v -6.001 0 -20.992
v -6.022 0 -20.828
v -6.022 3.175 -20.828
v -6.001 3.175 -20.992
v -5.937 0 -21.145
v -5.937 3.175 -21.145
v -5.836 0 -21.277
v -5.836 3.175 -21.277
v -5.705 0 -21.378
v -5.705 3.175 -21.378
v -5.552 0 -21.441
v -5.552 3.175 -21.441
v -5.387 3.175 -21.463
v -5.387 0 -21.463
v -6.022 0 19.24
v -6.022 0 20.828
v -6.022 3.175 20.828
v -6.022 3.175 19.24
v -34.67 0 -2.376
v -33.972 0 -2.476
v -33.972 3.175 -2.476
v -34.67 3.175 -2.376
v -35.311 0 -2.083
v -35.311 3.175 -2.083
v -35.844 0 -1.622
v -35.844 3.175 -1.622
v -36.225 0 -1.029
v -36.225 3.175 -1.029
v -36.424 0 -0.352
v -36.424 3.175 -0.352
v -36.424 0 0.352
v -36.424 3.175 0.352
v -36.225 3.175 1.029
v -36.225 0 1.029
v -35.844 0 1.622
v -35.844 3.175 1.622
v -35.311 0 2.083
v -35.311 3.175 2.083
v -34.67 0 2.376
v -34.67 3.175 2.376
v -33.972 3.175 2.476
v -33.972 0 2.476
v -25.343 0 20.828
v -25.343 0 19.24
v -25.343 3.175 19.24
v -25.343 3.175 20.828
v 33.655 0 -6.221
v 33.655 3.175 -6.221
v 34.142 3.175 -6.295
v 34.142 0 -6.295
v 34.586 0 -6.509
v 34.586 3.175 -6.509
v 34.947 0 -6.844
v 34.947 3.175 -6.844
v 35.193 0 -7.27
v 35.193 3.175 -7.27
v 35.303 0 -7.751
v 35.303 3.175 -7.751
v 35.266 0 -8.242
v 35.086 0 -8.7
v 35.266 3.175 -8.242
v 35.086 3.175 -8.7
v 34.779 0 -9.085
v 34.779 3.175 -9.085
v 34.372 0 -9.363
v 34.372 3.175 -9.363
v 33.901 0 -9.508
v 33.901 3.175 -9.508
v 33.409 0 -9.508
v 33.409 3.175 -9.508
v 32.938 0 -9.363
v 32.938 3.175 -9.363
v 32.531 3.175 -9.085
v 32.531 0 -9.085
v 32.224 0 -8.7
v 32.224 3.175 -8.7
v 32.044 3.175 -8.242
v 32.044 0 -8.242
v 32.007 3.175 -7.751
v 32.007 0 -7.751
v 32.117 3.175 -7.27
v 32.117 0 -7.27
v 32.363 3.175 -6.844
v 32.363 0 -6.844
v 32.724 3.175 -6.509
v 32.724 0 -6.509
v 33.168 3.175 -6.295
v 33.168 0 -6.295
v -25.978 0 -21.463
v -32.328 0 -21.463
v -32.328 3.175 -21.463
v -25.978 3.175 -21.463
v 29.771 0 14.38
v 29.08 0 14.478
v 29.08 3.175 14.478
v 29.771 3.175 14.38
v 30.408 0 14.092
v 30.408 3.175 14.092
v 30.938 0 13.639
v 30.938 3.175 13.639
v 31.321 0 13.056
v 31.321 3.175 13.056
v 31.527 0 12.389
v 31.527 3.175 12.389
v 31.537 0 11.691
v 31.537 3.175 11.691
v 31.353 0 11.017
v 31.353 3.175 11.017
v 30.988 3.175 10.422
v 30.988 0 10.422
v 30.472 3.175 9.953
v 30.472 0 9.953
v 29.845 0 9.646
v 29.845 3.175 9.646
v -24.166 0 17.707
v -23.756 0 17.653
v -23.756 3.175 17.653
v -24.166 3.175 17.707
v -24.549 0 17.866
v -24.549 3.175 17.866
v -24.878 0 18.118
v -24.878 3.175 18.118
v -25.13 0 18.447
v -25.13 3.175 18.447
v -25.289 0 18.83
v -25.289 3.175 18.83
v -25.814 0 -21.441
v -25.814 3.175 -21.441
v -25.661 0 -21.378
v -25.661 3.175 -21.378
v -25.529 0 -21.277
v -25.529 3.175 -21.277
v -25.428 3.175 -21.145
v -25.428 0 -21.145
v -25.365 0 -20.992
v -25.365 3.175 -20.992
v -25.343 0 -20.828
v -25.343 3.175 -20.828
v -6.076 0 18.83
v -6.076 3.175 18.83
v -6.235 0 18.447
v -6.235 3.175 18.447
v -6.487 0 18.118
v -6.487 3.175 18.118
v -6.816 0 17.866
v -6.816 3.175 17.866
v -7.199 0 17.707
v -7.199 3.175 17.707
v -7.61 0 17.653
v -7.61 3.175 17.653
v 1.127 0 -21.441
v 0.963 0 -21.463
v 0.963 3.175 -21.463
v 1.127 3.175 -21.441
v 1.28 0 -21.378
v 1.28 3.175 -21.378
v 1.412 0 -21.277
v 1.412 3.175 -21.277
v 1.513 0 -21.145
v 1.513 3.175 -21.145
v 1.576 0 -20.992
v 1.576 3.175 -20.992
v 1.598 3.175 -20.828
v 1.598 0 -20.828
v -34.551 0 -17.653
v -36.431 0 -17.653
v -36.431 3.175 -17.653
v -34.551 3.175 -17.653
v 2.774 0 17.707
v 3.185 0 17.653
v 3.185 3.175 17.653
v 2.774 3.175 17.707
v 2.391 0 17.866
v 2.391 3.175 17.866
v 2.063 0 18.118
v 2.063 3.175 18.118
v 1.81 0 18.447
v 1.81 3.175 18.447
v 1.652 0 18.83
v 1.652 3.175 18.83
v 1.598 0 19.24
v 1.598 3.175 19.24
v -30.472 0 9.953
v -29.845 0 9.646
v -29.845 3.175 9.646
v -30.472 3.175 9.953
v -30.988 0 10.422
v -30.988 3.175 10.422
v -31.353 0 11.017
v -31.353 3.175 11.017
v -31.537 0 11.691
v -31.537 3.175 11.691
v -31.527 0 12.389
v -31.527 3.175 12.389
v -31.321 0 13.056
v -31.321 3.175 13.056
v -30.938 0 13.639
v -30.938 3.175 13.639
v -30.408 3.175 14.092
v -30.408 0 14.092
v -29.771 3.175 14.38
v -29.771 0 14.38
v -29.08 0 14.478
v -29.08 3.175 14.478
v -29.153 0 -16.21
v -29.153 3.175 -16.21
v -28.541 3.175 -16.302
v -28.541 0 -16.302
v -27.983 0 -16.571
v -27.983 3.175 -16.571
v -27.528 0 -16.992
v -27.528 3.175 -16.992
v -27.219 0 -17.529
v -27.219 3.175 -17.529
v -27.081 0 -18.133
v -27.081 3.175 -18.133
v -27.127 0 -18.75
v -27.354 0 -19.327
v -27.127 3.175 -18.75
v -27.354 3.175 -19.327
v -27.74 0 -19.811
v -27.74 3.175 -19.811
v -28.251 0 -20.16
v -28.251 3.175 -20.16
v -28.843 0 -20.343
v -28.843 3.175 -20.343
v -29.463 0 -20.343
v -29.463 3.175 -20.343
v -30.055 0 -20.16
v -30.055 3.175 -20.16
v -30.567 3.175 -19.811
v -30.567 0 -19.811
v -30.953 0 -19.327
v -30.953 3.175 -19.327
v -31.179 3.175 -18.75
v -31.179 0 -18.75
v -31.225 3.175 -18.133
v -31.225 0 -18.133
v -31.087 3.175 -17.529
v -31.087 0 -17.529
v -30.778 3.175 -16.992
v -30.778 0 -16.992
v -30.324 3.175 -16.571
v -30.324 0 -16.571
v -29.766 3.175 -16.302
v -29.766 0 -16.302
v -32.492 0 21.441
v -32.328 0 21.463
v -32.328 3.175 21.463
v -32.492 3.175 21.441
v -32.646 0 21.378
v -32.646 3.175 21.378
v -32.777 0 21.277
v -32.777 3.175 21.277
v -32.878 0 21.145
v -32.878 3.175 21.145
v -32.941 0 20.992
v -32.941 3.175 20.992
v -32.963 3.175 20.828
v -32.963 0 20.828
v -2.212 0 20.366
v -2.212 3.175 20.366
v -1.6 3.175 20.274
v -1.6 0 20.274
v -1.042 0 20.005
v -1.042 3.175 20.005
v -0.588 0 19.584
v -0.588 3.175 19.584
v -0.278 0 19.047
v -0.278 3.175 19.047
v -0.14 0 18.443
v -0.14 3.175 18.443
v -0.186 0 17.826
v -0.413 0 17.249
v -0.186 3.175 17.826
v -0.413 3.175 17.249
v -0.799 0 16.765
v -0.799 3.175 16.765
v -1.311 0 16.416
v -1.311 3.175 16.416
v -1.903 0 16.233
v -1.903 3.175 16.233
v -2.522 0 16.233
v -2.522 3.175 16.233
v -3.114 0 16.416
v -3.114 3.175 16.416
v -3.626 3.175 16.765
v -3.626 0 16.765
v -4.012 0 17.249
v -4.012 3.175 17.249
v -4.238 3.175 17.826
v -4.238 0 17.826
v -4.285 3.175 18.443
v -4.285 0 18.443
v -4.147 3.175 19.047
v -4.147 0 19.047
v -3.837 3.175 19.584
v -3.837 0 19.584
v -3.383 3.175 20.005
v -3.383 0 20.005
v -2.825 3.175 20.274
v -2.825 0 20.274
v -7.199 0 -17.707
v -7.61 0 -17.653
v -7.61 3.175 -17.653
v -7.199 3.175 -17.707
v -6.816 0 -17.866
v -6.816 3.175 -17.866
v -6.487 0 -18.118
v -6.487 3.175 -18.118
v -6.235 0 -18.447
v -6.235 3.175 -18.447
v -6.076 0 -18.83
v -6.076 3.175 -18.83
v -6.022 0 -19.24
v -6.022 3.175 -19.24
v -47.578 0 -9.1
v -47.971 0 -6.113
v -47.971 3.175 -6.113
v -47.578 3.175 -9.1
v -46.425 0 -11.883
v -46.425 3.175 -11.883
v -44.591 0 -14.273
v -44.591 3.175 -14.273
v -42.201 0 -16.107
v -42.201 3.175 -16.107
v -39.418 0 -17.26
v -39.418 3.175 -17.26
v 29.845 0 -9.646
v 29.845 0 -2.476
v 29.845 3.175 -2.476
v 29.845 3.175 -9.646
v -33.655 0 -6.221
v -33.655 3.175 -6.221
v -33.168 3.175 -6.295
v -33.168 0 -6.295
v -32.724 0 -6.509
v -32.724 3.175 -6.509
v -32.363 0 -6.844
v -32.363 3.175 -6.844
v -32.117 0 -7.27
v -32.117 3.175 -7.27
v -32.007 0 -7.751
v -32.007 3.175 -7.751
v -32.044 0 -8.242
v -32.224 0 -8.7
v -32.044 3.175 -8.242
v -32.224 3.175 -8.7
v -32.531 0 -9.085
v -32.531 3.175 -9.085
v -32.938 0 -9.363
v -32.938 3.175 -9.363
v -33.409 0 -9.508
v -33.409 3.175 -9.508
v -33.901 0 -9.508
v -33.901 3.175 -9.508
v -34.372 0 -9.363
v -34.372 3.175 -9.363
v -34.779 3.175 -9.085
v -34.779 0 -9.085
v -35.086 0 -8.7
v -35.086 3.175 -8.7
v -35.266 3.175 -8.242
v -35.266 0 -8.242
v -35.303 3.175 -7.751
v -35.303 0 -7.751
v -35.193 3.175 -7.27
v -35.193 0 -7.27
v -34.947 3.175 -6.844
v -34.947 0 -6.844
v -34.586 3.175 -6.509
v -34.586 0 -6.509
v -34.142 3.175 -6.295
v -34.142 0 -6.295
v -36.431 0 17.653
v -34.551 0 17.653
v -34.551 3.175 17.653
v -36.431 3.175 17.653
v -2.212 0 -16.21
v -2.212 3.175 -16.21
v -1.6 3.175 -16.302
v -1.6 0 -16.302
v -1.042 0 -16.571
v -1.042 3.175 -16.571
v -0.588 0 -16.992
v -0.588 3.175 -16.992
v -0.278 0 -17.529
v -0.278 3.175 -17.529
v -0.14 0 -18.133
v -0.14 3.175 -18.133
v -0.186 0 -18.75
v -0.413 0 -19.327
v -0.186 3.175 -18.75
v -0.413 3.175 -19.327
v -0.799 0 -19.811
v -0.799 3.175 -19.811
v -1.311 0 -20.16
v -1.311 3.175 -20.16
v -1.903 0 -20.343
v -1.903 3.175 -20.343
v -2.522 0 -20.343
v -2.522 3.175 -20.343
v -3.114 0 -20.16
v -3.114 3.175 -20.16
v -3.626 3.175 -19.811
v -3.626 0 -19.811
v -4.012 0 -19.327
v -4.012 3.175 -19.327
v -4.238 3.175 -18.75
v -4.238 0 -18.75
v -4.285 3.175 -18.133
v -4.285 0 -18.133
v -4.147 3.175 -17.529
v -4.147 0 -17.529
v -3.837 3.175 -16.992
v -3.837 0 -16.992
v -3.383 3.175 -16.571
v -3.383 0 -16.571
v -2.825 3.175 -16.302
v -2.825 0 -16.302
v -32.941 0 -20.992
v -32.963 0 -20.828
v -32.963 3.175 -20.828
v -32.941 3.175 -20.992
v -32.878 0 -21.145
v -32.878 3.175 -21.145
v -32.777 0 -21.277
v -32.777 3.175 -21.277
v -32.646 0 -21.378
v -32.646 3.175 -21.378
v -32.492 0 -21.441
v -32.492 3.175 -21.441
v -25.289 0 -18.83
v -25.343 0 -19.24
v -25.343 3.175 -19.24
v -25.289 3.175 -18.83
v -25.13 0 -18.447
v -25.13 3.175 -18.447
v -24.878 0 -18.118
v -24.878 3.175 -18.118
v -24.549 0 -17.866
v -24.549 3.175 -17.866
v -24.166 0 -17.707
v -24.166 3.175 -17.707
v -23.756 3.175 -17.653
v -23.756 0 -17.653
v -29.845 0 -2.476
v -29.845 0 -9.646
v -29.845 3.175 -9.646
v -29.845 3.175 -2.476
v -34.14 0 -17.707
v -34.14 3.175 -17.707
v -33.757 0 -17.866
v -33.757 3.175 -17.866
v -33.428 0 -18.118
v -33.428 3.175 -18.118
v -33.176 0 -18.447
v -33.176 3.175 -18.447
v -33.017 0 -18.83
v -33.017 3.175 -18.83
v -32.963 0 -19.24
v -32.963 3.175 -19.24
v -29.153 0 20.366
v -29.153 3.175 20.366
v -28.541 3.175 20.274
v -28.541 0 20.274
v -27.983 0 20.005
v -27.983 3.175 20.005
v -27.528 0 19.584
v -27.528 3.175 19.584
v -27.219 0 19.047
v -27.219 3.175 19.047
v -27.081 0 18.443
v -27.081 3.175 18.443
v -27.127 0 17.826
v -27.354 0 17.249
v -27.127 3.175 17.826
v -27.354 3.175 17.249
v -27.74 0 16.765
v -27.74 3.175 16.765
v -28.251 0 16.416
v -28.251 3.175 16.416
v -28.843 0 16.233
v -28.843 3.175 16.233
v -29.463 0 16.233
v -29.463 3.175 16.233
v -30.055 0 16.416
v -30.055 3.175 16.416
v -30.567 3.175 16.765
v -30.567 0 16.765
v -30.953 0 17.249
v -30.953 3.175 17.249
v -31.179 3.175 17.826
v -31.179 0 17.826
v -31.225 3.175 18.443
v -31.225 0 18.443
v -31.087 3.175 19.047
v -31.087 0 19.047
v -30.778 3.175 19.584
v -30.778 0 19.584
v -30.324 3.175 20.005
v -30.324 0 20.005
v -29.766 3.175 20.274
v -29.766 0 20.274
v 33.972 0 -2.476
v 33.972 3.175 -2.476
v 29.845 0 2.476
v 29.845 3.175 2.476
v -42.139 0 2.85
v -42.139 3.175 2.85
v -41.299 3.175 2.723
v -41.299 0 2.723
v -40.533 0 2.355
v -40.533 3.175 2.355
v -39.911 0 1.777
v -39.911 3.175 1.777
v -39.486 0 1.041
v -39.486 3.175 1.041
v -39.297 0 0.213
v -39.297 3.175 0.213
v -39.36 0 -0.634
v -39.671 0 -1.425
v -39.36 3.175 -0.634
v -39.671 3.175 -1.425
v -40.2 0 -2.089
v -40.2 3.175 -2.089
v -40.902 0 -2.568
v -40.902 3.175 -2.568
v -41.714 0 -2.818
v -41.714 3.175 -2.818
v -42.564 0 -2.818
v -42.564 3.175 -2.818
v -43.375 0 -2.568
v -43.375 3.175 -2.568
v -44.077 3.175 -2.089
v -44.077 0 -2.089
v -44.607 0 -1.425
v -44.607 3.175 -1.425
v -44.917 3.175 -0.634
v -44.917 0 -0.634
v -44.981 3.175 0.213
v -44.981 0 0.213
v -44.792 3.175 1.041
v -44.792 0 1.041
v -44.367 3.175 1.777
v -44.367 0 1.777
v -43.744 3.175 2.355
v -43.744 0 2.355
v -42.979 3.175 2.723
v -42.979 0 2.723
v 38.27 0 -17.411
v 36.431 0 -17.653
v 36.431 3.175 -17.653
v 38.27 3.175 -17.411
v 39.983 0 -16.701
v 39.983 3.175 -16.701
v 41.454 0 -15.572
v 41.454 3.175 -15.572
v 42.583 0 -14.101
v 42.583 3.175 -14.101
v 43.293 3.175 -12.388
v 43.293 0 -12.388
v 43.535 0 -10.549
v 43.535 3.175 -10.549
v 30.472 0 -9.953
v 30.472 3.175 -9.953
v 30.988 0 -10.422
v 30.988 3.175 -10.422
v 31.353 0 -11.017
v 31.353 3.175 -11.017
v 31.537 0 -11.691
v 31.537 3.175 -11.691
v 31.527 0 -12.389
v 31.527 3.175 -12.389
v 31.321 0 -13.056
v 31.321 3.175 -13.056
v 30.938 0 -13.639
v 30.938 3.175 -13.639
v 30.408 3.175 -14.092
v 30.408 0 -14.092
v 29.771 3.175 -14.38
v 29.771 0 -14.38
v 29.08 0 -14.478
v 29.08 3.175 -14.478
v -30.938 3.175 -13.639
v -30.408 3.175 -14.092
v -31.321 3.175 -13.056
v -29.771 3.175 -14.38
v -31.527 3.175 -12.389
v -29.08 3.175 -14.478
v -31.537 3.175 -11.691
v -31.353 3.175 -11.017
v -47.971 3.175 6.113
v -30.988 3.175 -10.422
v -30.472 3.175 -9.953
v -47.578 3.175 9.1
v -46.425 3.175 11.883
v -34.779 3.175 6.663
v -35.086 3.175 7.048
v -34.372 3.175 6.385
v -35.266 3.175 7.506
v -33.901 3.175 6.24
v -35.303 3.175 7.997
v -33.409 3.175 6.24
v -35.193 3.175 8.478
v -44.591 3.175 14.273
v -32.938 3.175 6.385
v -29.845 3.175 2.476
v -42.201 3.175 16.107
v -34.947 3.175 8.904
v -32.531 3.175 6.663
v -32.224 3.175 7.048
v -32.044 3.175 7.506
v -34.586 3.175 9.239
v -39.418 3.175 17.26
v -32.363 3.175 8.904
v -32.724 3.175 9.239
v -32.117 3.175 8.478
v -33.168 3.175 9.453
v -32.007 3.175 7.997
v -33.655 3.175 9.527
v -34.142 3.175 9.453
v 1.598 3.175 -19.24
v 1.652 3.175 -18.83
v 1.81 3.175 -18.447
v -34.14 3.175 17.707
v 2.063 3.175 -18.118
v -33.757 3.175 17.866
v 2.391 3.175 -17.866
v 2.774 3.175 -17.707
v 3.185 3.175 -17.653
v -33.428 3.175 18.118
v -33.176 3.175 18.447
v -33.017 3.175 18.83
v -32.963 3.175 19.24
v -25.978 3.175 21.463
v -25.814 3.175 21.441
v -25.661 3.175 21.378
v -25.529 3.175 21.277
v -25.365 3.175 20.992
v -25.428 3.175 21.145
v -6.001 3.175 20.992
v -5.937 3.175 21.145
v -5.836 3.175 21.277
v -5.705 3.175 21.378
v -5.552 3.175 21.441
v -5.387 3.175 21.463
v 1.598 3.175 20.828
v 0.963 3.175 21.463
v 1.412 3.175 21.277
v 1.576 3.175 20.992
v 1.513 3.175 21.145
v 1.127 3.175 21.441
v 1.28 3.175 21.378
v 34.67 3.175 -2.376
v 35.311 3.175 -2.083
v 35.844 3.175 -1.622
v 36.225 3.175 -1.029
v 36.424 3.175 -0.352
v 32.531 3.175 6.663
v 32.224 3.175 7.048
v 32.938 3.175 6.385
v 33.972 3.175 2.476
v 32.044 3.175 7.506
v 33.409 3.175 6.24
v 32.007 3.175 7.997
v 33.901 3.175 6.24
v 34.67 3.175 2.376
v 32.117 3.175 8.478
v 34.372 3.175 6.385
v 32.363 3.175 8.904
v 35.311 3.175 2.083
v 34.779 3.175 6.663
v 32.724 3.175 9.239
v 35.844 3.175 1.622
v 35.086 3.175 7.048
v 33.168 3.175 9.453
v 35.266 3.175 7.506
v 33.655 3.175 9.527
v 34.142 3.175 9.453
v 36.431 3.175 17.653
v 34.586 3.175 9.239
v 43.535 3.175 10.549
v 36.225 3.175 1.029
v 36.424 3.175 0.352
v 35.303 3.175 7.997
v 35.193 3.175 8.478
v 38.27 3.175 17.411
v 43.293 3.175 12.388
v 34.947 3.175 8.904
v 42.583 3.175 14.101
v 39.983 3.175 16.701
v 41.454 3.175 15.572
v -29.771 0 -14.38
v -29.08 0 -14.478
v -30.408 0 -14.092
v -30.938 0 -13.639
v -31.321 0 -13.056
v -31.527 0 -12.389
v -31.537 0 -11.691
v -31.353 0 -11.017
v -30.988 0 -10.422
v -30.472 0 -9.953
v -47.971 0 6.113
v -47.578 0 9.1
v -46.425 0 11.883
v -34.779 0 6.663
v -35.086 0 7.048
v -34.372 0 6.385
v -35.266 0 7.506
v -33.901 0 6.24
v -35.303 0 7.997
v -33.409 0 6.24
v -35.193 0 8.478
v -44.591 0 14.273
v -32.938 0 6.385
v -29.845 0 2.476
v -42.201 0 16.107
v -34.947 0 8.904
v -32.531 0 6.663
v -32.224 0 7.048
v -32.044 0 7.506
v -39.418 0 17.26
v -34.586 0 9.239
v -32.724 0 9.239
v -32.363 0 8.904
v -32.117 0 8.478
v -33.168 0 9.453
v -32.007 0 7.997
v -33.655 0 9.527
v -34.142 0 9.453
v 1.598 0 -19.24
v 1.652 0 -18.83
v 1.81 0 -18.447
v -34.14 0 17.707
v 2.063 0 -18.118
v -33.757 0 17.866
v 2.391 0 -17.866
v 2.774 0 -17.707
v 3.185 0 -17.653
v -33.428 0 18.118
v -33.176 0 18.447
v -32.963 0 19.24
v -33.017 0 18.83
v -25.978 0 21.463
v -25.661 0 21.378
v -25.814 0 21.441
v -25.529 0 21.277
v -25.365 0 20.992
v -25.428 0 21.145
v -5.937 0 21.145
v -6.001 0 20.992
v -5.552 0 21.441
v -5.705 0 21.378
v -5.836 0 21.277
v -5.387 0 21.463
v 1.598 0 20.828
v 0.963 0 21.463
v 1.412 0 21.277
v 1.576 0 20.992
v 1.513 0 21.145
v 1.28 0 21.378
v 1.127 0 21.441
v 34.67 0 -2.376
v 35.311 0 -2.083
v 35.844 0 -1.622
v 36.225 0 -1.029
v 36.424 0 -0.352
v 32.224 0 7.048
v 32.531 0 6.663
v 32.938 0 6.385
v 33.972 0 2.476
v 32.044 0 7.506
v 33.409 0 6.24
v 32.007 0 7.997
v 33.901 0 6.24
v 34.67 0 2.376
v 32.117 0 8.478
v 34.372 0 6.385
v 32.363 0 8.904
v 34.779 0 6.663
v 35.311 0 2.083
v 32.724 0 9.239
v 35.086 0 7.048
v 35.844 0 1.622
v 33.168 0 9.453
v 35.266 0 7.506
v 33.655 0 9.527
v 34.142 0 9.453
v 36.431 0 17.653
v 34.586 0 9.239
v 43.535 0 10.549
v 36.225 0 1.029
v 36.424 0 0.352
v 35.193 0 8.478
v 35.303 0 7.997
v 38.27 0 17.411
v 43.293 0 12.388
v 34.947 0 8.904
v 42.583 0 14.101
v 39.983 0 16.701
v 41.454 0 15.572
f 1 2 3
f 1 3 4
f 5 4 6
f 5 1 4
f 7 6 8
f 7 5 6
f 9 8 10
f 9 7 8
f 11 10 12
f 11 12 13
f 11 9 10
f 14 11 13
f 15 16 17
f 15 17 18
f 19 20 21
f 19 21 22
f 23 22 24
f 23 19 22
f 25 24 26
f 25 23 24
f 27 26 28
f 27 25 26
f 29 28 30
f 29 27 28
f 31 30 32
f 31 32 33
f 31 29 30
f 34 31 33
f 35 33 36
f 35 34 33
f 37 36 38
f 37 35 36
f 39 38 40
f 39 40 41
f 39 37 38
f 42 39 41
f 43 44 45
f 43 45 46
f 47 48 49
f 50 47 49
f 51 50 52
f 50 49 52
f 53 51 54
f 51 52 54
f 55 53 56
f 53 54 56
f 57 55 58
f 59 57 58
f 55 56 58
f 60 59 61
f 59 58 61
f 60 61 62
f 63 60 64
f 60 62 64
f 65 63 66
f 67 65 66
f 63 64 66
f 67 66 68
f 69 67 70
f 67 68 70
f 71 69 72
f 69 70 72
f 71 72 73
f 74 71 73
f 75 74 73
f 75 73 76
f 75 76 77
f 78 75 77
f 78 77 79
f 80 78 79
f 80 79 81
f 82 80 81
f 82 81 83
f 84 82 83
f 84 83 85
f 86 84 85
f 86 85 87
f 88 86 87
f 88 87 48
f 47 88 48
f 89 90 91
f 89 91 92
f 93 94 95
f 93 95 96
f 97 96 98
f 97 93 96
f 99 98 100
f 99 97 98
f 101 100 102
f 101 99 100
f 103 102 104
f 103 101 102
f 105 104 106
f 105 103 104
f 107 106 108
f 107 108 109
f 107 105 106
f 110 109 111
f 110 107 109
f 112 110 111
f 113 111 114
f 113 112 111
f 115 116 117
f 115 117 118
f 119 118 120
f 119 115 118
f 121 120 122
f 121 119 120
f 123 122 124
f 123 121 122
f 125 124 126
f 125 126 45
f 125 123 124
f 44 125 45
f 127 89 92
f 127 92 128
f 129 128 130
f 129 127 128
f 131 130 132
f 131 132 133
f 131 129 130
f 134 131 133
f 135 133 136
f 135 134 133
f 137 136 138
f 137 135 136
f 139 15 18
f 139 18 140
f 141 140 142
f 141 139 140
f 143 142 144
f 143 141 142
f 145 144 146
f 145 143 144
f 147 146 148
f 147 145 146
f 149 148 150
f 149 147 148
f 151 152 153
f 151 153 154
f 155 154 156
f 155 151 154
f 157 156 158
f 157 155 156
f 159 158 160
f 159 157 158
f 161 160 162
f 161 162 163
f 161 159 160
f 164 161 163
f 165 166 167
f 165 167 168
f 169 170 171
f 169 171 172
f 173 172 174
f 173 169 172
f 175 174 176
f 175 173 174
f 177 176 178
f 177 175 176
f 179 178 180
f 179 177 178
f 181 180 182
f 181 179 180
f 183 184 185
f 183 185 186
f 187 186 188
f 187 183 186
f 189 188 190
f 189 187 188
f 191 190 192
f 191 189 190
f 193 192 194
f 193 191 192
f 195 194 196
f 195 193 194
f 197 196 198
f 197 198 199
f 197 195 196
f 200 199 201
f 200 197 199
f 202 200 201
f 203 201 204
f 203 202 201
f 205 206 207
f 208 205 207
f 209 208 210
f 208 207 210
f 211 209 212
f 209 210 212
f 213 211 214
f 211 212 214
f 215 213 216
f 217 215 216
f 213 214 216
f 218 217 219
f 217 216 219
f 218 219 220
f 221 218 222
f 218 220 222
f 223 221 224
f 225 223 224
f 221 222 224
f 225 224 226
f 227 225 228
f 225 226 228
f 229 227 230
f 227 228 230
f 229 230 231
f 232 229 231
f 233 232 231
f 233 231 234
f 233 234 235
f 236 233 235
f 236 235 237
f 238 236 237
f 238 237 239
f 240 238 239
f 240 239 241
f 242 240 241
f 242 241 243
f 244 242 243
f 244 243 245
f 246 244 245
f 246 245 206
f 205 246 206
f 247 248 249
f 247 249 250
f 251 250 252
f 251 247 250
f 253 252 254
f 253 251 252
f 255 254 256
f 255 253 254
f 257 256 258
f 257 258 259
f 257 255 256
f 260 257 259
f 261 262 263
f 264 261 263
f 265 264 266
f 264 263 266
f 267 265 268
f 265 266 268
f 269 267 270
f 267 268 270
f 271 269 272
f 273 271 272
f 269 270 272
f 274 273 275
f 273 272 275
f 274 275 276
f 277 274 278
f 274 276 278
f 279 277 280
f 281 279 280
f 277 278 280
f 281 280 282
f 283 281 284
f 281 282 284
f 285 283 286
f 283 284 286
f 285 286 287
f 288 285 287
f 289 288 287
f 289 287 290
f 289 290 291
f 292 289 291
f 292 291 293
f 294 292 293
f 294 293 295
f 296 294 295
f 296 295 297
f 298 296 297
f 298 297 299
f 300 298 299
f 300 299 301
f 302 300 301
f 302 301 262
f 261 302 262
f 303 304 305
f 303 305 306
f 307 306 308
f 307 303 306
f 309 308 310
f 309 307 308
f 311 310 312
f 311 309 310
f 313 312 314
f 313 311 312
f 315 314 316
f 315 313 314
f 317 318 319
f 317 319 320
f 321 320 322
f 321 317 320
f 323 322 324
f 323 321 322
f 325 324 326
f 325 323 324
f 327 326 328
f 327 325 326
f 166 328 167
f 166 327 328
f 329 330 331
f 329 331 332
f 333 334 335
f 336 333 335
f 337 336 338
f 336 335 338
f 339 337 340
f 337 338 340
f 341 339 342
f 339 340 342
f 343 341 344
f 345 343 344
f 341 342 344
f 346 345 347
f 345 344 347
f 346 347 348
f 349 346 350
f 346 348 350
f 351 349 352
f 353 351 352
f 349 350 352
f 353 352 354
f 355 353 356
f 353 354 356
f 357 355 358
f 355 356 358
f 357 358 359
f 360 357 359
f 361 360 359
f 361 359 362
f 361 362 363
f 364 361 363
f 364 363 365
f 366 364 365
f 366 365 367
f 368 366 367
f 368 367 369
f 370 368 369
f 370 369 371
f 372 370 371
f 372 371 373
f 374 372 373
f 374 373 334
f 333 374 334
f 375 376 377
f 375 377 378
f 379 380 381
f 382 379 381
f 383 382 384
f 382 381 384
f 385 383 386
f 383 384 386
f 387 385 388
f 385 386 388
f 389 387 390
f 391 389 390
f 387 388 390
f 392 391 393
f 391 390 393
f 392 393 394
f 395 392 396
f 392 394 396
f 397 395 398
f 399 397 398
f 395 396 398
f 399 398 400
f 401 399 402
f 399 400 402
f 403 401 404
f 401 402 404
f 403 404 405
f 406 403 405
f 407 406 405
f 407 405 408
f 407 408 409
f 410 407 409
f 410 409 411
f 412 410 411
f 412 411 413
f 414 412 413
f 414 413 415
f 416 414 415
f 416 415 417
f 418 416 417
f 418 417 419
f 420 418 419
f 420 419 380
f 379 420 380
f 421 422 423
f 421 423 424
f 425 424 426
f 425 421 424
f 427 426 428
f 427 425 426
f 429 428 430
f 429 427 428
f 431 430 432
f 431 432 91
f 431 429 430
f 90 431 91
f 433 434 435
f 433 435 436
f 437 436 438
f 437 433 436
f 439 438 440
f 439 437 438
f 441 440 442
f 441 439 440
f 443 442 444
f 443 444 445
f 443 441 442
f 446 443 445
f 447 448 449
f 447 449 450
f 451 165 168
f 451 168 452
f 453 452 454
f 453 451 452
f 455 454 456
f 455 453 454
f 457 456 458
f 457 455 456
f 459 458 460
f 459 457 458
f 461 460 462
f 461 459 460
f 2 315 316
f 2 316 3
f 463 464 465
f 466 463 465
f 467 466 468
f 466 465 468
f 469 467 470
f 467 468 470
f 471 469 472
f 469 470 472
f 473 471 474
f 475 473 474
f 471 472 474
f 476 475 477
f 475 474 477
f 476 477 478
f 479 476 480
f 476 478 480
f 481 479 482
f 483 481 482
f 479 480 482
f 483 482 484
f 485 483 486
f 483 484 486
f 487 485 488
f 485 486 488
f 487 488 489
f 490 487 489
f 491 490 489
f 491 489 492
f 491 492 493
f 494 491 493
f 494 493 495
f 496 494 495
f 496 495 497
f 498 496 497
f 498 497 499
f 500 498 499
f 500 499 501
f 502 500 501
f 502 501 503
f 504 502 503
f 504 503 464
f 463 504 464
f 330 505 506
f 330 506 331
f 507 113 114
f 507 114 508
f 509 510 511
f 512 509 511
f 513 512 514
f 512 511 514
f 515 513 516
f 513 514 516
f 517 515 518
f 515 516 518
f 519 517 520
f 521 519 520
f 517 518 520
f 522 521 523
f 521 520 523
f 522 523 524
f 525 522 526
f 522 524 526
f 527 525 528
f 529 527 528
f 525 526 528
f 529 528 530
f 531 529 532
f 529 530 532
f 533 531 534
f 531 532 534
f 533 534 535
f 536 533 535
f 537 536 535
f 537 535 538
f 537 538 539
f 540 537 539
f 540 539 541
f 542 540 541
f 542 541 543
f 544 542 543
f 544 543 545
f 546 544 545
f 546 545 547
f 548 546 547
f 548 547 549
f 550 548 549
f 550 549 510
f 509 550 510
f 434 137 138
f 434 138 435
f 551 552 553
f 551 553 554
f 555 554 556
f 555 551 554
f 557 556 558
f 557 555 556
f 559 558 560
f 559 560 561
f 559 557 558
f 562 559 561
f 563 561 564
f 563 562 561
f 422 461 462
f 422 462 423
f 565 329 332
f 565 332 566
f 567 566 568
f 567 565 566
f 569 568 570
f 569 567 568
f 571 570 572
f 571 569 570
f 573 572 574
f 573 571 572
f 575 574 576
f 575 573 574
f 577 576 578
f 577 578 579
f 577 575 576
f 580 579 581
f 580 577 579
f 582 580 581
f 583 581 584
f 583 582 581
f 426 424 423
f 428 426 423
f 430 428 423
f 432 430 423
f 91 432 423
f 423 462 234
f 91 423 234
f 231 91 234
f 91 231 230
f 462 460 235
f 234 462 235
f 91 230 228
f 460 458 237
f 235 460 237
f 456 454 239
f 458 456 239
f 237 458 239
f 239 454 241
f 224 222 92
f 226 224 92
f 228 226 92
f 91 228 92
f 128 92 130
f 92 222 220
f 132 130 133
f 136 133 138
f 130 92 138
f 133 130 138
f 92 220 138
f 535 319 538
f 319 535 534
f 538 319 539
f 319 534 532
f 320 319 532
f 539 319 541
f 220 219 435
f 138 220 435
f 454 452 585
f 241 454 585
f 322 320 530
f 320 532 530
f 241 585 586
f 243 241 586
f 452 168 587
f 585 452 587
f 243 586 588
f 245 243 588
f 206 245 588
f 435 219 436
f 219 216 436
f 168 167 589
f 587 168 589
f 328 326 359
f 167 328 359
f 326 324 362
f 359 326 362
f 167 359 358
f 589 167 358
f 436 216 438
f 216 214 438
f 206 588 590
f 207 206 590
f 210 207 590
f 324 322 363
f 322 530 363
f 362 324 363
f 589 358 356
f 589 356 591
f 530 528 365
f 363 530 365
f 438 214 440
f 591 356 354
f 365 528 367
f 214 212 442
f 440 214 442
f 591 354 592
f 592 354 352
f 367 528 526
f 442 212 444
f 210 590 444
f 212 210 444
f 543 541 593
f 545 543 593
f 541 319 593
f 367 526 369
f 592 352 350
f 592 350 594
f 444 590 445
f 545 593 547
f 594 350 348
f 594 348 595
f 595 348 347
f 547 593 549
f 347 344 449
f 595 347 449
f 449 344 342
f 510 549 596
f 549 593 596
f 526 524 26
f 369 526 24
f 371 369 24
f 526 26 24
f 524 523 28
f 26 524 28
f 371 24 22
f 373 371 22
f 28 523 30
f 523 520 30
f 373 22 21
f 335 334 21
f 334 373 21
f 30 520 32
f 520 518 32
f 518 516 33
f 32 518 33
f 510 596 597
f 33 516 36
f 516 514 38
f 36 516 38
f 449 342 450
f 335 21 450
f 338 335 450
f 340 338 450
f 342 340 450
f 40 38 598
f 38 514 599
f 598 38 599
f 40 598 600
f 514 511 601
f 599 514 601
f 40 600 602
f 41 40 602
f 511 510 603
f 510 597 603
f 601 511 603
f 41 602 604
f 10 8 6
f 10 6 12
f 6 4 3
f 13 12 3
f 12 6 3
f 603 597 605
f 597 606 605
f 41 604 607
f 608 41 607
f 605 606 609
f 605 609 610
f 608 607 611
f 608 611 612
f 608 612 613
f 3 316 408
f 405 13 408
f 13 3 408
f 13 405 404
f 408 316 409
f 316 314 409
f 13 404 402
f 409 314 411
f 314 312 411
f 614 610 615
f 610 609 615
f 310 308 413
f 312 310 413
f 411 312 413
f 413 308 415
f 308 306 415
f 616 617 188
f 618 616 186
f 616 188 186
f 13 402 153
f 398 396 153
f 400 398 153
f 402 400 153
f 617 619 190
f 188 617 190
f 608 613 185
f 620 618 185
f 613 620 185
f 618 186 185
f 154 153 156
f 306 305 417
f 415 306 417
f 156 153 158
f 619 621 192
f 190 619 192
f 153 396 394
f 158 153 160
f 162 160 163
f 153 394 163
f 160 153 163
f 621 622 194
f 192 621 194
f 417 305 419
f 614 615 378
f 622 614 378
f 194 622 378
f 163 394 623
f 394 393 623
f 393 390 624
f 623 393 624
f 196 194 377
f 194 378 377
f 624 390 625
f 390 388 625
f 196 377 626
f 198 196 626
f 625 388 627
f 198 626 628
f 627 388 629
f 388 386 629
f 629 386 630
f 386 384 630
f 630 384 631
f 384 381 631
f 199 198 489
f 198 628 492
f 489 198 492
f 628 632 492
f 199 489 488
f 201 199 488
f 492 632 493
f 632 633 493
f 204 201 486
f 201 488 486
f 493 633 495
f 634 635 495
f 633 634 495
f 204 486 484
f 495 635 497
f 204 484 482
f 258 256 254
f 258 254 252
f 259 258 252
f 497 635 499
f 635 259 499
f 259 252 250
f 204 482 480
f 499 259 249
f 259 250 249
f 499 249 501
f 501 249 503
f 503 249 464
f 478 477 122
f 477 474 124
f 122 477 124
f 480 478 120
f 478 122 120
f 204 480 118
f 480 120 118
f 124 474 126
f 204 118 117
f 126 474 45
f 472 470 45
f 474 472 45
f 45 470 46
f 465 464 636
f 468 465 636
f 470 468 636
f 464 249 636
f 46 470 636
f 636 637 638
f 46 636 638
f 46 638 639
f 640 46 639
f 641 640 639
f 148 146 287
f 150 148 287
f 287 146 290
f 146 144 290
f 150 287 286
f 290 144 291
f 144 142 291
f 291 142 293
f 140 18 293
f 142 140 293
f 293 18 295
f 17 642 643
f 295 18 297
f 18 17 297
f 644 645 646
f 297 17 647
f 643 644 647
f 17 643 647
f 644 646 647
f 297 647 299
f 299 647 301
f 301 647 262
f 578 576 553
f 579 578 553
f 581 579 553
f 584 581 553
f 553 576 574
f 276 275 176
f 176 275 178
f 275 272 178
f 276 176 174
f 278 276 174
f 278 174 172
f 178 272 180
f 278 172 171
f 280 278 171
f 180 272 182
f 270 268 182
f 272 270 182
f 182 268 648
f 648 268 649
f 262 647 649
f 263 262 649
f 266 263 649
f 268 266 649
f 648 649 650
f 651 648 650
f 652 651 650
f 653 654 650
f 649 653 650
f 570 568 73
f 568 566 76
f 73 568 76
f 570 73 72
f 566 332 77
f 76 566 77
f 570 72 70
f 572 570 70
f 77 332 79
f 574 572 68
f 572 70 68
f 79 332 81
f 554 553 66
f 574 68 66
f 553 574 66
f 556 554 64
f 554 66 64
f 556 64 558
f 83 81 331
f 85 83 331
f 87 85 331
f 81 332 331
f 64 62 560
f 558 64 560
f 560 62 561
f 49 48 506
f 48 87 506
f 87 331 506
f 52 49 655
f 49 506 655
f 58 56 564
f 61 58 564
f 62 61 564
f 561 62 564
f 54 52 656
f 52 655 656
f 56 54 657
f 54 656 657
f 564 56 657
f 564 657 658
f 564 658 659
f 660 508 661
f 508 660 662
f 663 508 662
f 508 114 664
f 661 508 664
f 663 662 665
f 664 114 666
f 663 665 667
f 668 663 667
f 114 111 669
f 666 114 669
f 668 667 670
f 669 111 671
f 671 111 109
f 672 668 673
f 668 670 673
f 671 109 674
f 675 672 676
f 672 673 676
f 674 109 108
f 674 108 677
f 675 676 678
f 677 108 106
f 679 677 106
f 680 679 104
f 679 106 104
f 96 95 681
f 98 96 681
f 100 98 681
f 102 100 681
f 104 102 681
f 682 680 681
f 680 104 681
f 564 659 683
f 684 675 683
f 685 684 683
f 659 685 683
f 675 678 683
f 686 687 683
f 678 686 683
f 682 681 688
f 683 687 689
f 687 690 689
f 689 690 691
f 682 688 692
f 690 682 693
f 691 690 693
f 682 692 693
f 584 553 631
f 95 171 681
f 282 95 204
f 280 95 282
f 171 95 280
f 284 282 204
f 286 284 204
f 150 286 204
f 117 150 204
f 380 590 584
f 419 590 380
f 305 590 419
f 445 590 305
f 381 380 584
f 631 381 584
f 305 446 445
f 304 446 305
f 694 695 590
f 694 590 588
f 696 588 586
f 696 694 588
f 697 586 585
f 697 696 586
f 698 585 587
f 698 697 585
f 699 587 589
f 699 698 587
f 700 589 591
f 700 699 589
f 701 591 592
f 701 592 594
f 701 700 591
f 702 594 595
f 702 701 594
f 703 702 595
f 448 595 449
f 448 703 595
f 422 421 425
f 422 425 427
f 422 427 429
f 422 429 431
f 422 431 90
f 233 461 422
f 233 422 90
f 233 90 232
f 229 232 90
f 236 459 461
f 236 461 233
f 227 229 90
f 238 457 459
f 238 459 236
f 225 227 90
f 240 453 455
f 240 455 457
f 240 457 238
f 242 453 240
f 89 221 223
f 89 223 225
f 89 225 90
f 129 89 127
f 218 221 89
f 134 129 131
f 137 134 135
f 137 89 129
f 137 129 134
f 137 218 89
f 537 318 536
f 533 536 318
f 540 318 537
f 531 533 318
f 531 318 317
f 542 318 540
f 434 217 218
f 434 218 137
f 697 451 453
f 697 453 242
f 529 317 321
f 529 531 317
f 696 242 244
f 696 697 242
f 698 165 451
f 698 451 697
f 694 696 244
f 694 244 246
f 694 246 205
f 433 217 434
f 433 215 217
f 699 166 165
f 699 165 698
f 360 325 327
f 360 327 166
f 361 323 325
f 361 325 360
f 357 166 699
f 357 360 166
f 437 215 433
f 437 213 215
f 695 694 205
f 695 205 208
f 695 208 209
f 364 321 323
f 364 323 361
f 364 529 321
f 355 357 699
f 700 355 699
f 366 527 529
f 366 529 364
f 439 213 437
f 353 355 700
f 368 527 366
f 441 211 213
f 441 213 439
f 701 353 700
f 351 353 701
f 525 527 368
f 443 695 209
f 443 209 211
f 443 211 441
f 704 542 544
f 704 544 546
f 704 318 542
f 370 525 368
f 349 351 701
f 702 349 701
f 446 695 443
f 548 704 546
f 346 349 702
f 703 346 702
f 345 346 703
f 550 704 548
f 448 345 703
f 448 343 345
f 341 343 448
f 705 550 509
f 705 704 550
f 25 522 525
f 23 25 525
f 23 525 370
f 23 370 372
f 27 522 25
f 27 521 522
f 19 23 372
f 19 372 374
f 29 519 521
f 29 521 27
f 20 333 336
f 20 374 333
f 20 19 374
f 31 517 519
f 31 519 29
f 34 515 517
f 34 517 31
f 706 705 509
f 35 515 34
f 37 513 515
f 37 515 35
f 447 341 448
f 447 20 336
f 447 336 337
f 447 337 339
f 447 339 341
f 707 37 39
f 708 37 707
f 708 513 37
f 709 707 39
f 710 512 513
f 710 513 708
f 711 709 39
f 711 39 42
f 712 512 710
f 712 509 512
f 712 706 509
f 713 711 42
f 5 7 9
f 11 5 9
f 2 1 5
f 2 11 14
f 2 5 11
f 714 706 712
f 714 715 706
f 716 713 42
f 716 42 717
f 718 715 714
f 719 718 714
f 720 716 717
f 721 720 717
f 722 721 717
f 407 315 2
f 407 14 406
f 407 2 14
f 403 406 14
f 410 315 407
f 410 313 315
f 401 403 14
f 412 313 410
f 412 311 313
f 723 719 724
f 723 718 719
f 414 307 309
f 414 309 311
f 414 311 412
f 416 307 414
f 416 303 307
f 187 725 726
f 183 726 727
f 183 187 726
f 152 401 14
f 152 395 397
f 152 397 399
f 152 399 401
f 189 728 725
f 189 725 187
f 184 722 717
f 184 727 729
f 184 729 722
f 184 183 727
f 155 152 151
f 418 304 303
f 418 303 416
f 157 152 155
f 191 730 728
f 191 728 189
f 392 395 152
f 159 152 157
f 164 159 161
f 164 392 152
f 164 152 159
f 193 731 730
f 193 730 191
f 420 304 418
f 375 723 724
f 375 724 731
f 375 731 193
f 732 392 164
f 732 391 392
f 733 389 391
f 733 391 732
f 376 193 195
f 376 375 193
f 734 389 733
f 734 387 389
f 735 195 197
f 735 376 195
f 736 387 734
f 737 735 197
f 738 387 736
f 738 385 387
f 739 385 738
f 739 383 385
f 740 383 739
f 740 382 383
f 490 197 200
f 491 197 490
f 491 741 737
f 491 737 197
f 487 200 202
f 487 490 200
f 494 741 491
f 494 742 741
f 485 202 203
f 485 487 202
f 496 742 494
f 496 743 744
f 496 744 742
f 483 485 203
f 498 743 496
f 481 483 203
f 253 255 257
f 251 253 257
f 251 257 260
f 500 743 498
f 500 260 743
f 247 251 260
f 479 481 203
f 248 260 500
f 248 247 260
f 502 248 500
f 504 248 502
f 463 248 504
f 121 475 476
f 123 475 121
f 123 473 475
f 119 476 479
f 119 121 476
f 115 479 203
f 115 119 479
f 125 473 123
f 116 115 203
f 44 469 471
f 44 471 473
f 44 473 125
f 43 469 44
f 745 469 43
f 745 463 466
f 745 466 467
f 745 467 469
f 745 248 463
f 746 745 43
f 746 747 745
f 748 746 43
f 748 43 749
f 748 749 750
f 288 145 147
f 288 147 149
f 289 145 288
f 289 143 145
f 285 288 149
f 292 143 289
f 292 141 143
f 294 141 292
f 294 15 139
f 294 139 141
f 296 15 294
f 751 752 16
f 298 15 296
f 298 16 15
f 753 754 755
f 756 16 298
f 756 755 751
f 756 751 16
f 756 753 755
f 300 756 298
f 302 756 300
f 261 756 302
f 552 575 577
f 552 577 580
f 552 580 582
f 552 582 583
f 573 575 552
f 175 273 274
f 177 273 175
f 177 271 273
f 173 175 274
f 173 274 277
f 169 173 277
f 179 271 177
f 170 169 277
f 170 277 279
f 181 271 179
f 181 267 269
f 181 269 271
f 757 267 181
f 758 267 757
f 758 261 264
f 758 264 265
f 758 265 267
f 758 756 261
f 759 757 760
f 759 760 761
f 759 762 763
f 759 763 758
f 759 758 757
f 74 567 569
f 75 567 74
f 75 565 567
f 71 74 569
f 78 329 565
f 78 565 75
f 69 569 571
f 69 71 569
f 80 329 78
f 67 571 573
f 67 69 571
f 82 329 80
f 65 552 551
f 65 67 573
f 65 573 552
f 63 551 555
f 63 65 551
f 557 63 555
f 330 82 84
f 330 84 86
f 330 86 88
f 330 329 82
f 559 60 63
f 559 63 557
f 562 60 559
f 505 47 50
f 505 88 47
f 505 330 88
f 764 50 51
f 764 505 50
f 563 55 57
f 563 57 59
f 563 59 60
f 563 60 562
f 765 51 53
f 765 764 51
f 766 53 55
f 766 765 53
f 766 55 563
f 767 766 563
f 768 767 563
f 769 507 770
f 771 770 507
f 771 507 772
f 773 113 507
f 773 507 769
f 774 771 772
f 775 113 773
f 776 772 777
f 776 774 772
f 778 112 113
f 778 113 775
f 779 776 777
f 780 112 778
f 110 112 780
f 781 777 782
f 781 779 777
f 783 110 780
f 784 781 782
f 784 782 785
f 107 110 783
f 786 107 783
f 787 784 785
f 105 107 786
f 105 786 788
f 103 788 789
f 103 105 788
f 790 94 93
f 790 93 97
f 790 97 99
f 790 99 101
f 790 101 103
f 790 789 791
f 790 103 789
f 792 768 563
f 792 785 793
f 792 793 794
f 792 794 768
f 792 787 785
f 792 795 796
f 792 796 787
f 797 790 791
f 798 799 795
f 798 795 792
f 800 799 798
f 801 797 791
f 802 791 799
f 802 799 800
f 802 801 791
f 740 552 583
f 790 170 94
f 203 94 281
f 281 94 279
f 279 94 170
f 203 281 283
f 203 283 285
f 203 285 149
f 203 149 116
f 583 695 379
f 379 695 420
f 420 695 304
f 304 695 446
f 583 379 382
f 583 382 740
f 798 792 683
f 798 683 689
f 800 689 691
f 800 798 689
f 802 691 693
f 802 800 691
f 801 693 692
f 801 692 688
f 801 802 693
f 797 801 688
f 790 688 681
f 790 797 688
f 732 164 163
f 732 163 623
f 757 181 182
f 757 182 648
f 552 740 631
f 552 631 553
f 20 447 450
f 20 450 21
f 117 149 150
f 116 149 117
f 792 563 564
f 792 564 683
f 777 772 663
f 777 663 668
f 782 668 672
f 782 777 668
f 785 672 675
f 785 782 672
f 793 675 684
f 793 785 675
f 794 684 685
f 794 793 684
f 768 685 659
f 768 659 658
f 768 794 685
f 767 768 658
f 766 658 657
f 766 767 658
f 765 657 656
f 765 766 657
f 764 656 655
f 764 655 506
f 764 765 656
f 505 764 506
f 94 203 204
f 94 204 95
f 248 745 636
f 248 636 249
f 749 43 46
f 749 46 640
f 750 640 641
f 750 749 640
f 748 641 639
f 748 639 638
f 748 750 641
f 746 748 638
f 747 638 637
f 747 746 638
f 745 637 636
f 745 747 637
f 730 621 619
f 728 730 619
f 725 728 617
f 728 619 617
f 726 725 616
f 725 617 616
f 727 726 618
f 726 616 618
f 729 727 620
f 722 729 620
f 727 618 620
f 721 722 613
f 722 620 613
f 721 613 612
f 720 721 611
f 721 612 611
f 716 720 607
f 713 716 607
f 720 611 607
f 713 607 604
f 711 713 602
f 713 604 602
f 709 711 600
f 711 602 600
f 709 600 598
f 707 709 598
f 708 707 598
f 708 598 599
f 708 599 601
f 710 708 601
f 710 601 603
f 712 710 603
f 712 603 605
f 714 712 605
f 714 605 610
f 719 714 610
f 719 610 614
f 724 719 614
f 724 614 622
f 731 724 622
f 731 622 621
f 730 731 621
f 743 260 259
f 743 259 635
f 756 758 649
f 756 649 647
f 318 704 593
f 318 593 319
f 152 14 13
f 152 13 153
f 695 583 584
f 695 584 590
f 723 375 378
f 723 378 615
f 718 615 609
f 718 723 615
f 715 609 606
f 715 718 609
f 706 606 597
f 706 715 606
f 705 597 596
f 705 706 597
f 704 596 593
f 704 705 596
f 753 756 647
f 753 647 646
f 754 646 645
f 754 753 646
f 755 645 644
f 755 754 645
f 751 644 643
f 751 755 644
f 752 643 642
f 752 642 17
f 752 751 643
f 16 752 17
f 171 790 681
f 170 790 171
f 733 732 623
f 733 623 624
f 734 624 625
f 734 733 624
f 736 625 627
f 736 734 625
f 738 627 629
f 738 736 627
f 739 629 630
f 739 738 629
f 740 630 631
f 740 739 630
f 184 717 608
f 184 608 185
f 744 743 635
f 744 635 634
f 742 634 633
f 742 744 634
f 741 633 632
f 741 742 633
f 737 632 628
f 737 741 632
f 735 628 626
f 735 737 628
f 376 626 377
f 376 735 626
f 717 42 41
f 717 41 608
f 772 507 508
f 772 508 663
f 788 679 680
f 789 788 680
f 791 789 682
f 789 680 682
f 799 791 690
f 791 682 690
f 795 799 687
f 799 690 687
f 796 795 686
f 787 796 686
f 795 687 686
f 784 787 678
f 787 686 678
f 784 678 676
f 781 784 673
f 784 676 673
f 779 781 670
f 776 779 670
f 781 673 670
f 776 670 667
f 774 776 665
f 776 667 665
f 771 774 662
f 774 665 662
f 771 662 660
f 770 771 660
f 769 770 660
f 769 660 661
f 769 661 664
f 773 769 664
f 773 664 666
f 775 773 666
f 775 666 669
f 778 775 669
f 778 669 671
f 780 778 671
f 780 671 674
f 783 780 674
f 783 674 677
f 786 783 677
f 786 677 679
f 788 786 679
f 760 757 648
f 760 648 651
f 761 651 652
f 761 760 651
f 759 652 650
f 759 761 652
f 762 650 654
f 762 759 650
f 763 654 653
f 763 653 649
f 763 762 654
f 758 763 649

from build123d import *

# Parameters (mm, degrees)
CROQUIS1_R              = 1.35255
CROQUIS1_R_2            = 1.778
SALIENTE_EXTRUIR1_DEPTH = 3.175
CROQUIS5_R              = 2.55
CORTAR_EXTRUIR1_DEPTH   = 53.649355209
CROQUIS6_R              = 2.078
CROQUIS6_R_2            = 1.65255
CROQUIS6_R_3            = 2.85
CORTAR_EXTRUIR2_DEPTH   = 53.649355209


with BuildPart() as part:
    # Croquis1 → Saliente-Extruir1 (new body)
    with BuildSketch(Plane.XZ):
        with BuildLine():
            Line((-6.02234, -19.2405), (-6.02234, -20.828))
            ThreePointArc((-6.02234, -20.828), (-5.836352806, -21.277012806), (-5.38734, -21.463))
            Line((-5.38734, -21.463), (0.96266, -21.463))
            ThreePointArc((0.96266, -21.463), (1.411672806, -21.277012806), (1.59766, -20.828))
            Line((1.59766, -20.828), (1.59766, -19.2405))
            ThreePointArc((1.59766, -19.2405), (2.062627985, -18.117967985), (3.18516, -17.653))
            Line((3.18516, -17.653), (36.43122, -17.653))
            ThreePointArc((36.43122, -17.653), (41.454190356, -15.572417555), (43.534772801, -10.549447199))
            Line((43.534772801, -10.549447199), (43.534772801, 10.549447199))
            ThreePointArc((43.534772801, 10.549447199), (41.454190356, 15.572417555), (36.43122, 17.653))
            Line((36.43122, 17.653), (3.18516, 17.653))
            ThreePointArc((3.18516, 17.653), (2.062627985, 18.117967985), (1.59766, 19.2405))
            Line((1.59766, 19.2405), (1.59766, 20.828))
            ThreePointArc((1.59766, 20.828), (1.411672806, 21.277012806), (0.96266, 21.463))
            Line((0.96266, 21.463), (-5.38734, 21.463))
            ThreePointArc((-5.38734, 21.463), (-5.836352806, 21.277012806), (-6.02234, 20.828))
            Line((-6.02234, 20.828), (-6.02234, 19.2405))
            ThreePointArc((-6.02234, 19.2405), (-6.487307985, 18.117967985), (-7.60984, 17.653))
            Line((-7.60984, 17.653), (-23.755604, 17.653))
            ThreePointArc((-23.755604, 17.653), (-24.878136015, 18.117967985), (-25.343104, 19.2405))
            Line((-25.343104, 19.2405), (-25.343104, 20.828))
            ThreePointArc((-25.343104, 20.828), (-25.529091194, 21.277012806), (-25.978104, 21.463))
            Line((-25.978104, 21.463), (-32.328104, 21.463))
            ThreePointArc((-32.328104, 21.463), (-32.777116806, 21.277012806), (-32.963104, 20.828))
            Line((-32.963104, 20.828), (-32.963104, 19.2405))
            ThreePointArc((-32.963104, 19.2405), (-33.428071985, 18.117967985), (-34.550604, 17.653))
            Line((-34.550604, 17.653), (-36.43122, 17.653))
            ThreePointArc((-36.43122, 17.653), (-44.591052878, 14.273086555), (-47.970966323, 6.113253677))
            Line((-47.970966323, 6.113253677), (-47.970966323, -6.113253677))
            ThreePointArc((-47.970966323, -6.113253677), (-44.591052878, -14.273086555), (-36.43122, -17.653))
            Line((-36.43122, -17.653), (-34.550604, -17.653))
            ThreePointArc((-34.550604, -17.653), (-33.428071985, -18.117967985), (-32.963104, -19.2405))
            Line((-32.963104, -19.2405), (-32.963104, -20.828))
            ThreePointArc((-32.963104, -20.828), (-32.777116806, -21.277012806), (-32.328104, -21.463))
            Line((-32.328104, -21.463), (-25.978104, -21.463))
            ThreePointArc((-25.978104, -21.463), (-25.529091194, -21.277012806), (-25.343104, -20.828))
            Line((-25.343104, -20.828), (-25.343104, -19.2405))
            ThreePointArc((-25.343104, -19.2405), (-24.878136015, -18.117967985), (-23.755604, -17.653))
            Line((-23.755604, -17.653), (-7.60984, -17.653))
            ThreePointArc((-7.60984, -17.653), (-6.487307985, -18.117967985), (-6.02234, -19.2405))
        make_face()
        with Locations(Location((33.655, -7.874, 0), (0, 0, 90))):
            Circle(CROQUIS1_R, mode=Mode.SUBTRACT)
        with Locations(Location((-33.655, 7.874, 0), (0, 0, 90))):
            Circle(CROQUIS1_R, mode=Mode.SUBTRACT)
        with Locations(Location((-33.655, -7.874, 0), (0, 0, 90))):
            Circle(CROQUIS1_R, mode=Mode.SUBTRACT)
        with Locations(Location((-2.21234, 18.288, 0), (0, 0, 90))):
            Circle(CROQUIS1_R_2, mode=Mode.SUBTRACT)
        with Locations(Location((-29.153104, -18.288, 0), (0, 0, 90))):
            Circle(CROQUIS1_R_2, mode=Mode.SUBTRACT)
        with Locations(Location((-2.21234, -18.288, 0), (0, 0, 90))):
            Circle(CROQUIS1_R_2, mode=Mode.SUBTRACT)
        with Locations(Location((-29.153104, 18.288, 0), (0, 0, 90))):
            Circle(CROQUIS1_R_2, mode=Mode.SUBTRACT)
        with Locations(Location((33.655, 7.874, 0), (0, 0, 90))):
            Circle(CROQUIS1_R, mode=Mode.SUBTRACT)
        with BuildLine():
            Line((-33.9725, 2.4765), (-29.845, 2.4765))
            Line((-29.845, 2.4765), (-29.845, 9.645968035))
            ThreePointArc((-29.845, 9.645968035), (-31.52653105, 12.388525412), (-29.08046, 14.478))
            Line((-29.08046, 14.478), (29.08046, 14.478))
            ThreePointArc((29.08046, 14.478), (31.52653105, 12.388525412), (29.845, 9.645968035))
            Line((29.845, 9.645968035), (29.845, 2.4765))
            Line((29.845, 2.4765), (33.9725, 2.4765))
            ThreePointArc((33.9725, 2.4765), (36.449, 0), (33.9725, -2.4765))
            Line((33.9725, -2.4765), (29.845, -2.4765))
            Line((29.845, -2.4765), (29.845, -9.645968035))
            ThreePointArc((29.845, -9.645968035), (31.52653105, -12.388525412), (29.08046, -14.478))
            Line((29.08046, -14.478), (-29.08046, -14.478))
            ThreePointArc((-29.08046, -14.478), (-31.52653105, -12.388525412), (-29.845, -9.645968035))
            Line((-29.845, -9.645968035), (-29.845, -2.4765))
            Line((-29.845, -2.4765), (-33.9725, -2.4765))
            ThreePointArc((-33.9725, -2.4765), (-36.449, 0), (-33.9725, 2.4765))
        make_face(mode=Mode.SUBTRACT)
    extrude(amount=-SALIENTE_EXTRUIR1_DEPTH)

    # Croquis5 → Cortar-Extruir1 (cut, through all)
    with BuildSketch(Plane(origin=(0, 3.175, 0), x_dir=(1, 0, 0), z_dir=(0, 1, 0))):
        with Locations(Location((-42.138904379, 0, 0), (0, 0, 270))):
            Circle(CROQUIS5_R)
    extrude(amount=-CORTAR_EXTRUIR1_DEPTH, mode=Mode.SUBTRACT)

    # Croquis6 → Cortar-Extruir2 (cut, through all)
    with BuildSketch(Plane(origin=(0, 3.175, 0), x_dir=(1, 0, 0), z_dir=(0, 1, 0))):
        with Locations(Location((-29.153104, 18.288, 0), (0, 0, 270))):
            Circle(CROQUIS6_R)
        with Locations(Location((-33.655, 7.874, 0), (0, 0, 270))):
            Circle(CROQUIS6_R_2)
        with Locations(Location((-33.655, -7.874, 0), (0, 0, 270))):
            Circle(CROQUIS6_R_2)
        with Locations(Location((-29.153104, -18.288, 0), (0, 0, 270))):
            Circle(CROQUIS6_R)
        with Locations(Location((-2.21234, -18.288, 0), (0, 0, 270))):
            Circle(CROQUIS6_R)
        with Locations(Location((-42.138904379, 0, 0), (0, 0, 270))):
            Circle(CROQUIS6_R_3)
        with Locations(Location((-2.21234, 18.288, 0), (0, 0, 270))):
            Circle(CROQUIS6_R)
        with Locations(Location((33.655, 7.874, 0), (0, 0, 270))):
            Circle(CROQUIS6_R_2)
        with Locations(Location((33.655, -7.874, 0), (0, 0, 270))):
            Circle(CROQUIS6_R_2)
    extrude(amount=-CORTAR_EXTRUIR2_DEPTH, mode=Mode.SUBTRACT)


solid = part.part
